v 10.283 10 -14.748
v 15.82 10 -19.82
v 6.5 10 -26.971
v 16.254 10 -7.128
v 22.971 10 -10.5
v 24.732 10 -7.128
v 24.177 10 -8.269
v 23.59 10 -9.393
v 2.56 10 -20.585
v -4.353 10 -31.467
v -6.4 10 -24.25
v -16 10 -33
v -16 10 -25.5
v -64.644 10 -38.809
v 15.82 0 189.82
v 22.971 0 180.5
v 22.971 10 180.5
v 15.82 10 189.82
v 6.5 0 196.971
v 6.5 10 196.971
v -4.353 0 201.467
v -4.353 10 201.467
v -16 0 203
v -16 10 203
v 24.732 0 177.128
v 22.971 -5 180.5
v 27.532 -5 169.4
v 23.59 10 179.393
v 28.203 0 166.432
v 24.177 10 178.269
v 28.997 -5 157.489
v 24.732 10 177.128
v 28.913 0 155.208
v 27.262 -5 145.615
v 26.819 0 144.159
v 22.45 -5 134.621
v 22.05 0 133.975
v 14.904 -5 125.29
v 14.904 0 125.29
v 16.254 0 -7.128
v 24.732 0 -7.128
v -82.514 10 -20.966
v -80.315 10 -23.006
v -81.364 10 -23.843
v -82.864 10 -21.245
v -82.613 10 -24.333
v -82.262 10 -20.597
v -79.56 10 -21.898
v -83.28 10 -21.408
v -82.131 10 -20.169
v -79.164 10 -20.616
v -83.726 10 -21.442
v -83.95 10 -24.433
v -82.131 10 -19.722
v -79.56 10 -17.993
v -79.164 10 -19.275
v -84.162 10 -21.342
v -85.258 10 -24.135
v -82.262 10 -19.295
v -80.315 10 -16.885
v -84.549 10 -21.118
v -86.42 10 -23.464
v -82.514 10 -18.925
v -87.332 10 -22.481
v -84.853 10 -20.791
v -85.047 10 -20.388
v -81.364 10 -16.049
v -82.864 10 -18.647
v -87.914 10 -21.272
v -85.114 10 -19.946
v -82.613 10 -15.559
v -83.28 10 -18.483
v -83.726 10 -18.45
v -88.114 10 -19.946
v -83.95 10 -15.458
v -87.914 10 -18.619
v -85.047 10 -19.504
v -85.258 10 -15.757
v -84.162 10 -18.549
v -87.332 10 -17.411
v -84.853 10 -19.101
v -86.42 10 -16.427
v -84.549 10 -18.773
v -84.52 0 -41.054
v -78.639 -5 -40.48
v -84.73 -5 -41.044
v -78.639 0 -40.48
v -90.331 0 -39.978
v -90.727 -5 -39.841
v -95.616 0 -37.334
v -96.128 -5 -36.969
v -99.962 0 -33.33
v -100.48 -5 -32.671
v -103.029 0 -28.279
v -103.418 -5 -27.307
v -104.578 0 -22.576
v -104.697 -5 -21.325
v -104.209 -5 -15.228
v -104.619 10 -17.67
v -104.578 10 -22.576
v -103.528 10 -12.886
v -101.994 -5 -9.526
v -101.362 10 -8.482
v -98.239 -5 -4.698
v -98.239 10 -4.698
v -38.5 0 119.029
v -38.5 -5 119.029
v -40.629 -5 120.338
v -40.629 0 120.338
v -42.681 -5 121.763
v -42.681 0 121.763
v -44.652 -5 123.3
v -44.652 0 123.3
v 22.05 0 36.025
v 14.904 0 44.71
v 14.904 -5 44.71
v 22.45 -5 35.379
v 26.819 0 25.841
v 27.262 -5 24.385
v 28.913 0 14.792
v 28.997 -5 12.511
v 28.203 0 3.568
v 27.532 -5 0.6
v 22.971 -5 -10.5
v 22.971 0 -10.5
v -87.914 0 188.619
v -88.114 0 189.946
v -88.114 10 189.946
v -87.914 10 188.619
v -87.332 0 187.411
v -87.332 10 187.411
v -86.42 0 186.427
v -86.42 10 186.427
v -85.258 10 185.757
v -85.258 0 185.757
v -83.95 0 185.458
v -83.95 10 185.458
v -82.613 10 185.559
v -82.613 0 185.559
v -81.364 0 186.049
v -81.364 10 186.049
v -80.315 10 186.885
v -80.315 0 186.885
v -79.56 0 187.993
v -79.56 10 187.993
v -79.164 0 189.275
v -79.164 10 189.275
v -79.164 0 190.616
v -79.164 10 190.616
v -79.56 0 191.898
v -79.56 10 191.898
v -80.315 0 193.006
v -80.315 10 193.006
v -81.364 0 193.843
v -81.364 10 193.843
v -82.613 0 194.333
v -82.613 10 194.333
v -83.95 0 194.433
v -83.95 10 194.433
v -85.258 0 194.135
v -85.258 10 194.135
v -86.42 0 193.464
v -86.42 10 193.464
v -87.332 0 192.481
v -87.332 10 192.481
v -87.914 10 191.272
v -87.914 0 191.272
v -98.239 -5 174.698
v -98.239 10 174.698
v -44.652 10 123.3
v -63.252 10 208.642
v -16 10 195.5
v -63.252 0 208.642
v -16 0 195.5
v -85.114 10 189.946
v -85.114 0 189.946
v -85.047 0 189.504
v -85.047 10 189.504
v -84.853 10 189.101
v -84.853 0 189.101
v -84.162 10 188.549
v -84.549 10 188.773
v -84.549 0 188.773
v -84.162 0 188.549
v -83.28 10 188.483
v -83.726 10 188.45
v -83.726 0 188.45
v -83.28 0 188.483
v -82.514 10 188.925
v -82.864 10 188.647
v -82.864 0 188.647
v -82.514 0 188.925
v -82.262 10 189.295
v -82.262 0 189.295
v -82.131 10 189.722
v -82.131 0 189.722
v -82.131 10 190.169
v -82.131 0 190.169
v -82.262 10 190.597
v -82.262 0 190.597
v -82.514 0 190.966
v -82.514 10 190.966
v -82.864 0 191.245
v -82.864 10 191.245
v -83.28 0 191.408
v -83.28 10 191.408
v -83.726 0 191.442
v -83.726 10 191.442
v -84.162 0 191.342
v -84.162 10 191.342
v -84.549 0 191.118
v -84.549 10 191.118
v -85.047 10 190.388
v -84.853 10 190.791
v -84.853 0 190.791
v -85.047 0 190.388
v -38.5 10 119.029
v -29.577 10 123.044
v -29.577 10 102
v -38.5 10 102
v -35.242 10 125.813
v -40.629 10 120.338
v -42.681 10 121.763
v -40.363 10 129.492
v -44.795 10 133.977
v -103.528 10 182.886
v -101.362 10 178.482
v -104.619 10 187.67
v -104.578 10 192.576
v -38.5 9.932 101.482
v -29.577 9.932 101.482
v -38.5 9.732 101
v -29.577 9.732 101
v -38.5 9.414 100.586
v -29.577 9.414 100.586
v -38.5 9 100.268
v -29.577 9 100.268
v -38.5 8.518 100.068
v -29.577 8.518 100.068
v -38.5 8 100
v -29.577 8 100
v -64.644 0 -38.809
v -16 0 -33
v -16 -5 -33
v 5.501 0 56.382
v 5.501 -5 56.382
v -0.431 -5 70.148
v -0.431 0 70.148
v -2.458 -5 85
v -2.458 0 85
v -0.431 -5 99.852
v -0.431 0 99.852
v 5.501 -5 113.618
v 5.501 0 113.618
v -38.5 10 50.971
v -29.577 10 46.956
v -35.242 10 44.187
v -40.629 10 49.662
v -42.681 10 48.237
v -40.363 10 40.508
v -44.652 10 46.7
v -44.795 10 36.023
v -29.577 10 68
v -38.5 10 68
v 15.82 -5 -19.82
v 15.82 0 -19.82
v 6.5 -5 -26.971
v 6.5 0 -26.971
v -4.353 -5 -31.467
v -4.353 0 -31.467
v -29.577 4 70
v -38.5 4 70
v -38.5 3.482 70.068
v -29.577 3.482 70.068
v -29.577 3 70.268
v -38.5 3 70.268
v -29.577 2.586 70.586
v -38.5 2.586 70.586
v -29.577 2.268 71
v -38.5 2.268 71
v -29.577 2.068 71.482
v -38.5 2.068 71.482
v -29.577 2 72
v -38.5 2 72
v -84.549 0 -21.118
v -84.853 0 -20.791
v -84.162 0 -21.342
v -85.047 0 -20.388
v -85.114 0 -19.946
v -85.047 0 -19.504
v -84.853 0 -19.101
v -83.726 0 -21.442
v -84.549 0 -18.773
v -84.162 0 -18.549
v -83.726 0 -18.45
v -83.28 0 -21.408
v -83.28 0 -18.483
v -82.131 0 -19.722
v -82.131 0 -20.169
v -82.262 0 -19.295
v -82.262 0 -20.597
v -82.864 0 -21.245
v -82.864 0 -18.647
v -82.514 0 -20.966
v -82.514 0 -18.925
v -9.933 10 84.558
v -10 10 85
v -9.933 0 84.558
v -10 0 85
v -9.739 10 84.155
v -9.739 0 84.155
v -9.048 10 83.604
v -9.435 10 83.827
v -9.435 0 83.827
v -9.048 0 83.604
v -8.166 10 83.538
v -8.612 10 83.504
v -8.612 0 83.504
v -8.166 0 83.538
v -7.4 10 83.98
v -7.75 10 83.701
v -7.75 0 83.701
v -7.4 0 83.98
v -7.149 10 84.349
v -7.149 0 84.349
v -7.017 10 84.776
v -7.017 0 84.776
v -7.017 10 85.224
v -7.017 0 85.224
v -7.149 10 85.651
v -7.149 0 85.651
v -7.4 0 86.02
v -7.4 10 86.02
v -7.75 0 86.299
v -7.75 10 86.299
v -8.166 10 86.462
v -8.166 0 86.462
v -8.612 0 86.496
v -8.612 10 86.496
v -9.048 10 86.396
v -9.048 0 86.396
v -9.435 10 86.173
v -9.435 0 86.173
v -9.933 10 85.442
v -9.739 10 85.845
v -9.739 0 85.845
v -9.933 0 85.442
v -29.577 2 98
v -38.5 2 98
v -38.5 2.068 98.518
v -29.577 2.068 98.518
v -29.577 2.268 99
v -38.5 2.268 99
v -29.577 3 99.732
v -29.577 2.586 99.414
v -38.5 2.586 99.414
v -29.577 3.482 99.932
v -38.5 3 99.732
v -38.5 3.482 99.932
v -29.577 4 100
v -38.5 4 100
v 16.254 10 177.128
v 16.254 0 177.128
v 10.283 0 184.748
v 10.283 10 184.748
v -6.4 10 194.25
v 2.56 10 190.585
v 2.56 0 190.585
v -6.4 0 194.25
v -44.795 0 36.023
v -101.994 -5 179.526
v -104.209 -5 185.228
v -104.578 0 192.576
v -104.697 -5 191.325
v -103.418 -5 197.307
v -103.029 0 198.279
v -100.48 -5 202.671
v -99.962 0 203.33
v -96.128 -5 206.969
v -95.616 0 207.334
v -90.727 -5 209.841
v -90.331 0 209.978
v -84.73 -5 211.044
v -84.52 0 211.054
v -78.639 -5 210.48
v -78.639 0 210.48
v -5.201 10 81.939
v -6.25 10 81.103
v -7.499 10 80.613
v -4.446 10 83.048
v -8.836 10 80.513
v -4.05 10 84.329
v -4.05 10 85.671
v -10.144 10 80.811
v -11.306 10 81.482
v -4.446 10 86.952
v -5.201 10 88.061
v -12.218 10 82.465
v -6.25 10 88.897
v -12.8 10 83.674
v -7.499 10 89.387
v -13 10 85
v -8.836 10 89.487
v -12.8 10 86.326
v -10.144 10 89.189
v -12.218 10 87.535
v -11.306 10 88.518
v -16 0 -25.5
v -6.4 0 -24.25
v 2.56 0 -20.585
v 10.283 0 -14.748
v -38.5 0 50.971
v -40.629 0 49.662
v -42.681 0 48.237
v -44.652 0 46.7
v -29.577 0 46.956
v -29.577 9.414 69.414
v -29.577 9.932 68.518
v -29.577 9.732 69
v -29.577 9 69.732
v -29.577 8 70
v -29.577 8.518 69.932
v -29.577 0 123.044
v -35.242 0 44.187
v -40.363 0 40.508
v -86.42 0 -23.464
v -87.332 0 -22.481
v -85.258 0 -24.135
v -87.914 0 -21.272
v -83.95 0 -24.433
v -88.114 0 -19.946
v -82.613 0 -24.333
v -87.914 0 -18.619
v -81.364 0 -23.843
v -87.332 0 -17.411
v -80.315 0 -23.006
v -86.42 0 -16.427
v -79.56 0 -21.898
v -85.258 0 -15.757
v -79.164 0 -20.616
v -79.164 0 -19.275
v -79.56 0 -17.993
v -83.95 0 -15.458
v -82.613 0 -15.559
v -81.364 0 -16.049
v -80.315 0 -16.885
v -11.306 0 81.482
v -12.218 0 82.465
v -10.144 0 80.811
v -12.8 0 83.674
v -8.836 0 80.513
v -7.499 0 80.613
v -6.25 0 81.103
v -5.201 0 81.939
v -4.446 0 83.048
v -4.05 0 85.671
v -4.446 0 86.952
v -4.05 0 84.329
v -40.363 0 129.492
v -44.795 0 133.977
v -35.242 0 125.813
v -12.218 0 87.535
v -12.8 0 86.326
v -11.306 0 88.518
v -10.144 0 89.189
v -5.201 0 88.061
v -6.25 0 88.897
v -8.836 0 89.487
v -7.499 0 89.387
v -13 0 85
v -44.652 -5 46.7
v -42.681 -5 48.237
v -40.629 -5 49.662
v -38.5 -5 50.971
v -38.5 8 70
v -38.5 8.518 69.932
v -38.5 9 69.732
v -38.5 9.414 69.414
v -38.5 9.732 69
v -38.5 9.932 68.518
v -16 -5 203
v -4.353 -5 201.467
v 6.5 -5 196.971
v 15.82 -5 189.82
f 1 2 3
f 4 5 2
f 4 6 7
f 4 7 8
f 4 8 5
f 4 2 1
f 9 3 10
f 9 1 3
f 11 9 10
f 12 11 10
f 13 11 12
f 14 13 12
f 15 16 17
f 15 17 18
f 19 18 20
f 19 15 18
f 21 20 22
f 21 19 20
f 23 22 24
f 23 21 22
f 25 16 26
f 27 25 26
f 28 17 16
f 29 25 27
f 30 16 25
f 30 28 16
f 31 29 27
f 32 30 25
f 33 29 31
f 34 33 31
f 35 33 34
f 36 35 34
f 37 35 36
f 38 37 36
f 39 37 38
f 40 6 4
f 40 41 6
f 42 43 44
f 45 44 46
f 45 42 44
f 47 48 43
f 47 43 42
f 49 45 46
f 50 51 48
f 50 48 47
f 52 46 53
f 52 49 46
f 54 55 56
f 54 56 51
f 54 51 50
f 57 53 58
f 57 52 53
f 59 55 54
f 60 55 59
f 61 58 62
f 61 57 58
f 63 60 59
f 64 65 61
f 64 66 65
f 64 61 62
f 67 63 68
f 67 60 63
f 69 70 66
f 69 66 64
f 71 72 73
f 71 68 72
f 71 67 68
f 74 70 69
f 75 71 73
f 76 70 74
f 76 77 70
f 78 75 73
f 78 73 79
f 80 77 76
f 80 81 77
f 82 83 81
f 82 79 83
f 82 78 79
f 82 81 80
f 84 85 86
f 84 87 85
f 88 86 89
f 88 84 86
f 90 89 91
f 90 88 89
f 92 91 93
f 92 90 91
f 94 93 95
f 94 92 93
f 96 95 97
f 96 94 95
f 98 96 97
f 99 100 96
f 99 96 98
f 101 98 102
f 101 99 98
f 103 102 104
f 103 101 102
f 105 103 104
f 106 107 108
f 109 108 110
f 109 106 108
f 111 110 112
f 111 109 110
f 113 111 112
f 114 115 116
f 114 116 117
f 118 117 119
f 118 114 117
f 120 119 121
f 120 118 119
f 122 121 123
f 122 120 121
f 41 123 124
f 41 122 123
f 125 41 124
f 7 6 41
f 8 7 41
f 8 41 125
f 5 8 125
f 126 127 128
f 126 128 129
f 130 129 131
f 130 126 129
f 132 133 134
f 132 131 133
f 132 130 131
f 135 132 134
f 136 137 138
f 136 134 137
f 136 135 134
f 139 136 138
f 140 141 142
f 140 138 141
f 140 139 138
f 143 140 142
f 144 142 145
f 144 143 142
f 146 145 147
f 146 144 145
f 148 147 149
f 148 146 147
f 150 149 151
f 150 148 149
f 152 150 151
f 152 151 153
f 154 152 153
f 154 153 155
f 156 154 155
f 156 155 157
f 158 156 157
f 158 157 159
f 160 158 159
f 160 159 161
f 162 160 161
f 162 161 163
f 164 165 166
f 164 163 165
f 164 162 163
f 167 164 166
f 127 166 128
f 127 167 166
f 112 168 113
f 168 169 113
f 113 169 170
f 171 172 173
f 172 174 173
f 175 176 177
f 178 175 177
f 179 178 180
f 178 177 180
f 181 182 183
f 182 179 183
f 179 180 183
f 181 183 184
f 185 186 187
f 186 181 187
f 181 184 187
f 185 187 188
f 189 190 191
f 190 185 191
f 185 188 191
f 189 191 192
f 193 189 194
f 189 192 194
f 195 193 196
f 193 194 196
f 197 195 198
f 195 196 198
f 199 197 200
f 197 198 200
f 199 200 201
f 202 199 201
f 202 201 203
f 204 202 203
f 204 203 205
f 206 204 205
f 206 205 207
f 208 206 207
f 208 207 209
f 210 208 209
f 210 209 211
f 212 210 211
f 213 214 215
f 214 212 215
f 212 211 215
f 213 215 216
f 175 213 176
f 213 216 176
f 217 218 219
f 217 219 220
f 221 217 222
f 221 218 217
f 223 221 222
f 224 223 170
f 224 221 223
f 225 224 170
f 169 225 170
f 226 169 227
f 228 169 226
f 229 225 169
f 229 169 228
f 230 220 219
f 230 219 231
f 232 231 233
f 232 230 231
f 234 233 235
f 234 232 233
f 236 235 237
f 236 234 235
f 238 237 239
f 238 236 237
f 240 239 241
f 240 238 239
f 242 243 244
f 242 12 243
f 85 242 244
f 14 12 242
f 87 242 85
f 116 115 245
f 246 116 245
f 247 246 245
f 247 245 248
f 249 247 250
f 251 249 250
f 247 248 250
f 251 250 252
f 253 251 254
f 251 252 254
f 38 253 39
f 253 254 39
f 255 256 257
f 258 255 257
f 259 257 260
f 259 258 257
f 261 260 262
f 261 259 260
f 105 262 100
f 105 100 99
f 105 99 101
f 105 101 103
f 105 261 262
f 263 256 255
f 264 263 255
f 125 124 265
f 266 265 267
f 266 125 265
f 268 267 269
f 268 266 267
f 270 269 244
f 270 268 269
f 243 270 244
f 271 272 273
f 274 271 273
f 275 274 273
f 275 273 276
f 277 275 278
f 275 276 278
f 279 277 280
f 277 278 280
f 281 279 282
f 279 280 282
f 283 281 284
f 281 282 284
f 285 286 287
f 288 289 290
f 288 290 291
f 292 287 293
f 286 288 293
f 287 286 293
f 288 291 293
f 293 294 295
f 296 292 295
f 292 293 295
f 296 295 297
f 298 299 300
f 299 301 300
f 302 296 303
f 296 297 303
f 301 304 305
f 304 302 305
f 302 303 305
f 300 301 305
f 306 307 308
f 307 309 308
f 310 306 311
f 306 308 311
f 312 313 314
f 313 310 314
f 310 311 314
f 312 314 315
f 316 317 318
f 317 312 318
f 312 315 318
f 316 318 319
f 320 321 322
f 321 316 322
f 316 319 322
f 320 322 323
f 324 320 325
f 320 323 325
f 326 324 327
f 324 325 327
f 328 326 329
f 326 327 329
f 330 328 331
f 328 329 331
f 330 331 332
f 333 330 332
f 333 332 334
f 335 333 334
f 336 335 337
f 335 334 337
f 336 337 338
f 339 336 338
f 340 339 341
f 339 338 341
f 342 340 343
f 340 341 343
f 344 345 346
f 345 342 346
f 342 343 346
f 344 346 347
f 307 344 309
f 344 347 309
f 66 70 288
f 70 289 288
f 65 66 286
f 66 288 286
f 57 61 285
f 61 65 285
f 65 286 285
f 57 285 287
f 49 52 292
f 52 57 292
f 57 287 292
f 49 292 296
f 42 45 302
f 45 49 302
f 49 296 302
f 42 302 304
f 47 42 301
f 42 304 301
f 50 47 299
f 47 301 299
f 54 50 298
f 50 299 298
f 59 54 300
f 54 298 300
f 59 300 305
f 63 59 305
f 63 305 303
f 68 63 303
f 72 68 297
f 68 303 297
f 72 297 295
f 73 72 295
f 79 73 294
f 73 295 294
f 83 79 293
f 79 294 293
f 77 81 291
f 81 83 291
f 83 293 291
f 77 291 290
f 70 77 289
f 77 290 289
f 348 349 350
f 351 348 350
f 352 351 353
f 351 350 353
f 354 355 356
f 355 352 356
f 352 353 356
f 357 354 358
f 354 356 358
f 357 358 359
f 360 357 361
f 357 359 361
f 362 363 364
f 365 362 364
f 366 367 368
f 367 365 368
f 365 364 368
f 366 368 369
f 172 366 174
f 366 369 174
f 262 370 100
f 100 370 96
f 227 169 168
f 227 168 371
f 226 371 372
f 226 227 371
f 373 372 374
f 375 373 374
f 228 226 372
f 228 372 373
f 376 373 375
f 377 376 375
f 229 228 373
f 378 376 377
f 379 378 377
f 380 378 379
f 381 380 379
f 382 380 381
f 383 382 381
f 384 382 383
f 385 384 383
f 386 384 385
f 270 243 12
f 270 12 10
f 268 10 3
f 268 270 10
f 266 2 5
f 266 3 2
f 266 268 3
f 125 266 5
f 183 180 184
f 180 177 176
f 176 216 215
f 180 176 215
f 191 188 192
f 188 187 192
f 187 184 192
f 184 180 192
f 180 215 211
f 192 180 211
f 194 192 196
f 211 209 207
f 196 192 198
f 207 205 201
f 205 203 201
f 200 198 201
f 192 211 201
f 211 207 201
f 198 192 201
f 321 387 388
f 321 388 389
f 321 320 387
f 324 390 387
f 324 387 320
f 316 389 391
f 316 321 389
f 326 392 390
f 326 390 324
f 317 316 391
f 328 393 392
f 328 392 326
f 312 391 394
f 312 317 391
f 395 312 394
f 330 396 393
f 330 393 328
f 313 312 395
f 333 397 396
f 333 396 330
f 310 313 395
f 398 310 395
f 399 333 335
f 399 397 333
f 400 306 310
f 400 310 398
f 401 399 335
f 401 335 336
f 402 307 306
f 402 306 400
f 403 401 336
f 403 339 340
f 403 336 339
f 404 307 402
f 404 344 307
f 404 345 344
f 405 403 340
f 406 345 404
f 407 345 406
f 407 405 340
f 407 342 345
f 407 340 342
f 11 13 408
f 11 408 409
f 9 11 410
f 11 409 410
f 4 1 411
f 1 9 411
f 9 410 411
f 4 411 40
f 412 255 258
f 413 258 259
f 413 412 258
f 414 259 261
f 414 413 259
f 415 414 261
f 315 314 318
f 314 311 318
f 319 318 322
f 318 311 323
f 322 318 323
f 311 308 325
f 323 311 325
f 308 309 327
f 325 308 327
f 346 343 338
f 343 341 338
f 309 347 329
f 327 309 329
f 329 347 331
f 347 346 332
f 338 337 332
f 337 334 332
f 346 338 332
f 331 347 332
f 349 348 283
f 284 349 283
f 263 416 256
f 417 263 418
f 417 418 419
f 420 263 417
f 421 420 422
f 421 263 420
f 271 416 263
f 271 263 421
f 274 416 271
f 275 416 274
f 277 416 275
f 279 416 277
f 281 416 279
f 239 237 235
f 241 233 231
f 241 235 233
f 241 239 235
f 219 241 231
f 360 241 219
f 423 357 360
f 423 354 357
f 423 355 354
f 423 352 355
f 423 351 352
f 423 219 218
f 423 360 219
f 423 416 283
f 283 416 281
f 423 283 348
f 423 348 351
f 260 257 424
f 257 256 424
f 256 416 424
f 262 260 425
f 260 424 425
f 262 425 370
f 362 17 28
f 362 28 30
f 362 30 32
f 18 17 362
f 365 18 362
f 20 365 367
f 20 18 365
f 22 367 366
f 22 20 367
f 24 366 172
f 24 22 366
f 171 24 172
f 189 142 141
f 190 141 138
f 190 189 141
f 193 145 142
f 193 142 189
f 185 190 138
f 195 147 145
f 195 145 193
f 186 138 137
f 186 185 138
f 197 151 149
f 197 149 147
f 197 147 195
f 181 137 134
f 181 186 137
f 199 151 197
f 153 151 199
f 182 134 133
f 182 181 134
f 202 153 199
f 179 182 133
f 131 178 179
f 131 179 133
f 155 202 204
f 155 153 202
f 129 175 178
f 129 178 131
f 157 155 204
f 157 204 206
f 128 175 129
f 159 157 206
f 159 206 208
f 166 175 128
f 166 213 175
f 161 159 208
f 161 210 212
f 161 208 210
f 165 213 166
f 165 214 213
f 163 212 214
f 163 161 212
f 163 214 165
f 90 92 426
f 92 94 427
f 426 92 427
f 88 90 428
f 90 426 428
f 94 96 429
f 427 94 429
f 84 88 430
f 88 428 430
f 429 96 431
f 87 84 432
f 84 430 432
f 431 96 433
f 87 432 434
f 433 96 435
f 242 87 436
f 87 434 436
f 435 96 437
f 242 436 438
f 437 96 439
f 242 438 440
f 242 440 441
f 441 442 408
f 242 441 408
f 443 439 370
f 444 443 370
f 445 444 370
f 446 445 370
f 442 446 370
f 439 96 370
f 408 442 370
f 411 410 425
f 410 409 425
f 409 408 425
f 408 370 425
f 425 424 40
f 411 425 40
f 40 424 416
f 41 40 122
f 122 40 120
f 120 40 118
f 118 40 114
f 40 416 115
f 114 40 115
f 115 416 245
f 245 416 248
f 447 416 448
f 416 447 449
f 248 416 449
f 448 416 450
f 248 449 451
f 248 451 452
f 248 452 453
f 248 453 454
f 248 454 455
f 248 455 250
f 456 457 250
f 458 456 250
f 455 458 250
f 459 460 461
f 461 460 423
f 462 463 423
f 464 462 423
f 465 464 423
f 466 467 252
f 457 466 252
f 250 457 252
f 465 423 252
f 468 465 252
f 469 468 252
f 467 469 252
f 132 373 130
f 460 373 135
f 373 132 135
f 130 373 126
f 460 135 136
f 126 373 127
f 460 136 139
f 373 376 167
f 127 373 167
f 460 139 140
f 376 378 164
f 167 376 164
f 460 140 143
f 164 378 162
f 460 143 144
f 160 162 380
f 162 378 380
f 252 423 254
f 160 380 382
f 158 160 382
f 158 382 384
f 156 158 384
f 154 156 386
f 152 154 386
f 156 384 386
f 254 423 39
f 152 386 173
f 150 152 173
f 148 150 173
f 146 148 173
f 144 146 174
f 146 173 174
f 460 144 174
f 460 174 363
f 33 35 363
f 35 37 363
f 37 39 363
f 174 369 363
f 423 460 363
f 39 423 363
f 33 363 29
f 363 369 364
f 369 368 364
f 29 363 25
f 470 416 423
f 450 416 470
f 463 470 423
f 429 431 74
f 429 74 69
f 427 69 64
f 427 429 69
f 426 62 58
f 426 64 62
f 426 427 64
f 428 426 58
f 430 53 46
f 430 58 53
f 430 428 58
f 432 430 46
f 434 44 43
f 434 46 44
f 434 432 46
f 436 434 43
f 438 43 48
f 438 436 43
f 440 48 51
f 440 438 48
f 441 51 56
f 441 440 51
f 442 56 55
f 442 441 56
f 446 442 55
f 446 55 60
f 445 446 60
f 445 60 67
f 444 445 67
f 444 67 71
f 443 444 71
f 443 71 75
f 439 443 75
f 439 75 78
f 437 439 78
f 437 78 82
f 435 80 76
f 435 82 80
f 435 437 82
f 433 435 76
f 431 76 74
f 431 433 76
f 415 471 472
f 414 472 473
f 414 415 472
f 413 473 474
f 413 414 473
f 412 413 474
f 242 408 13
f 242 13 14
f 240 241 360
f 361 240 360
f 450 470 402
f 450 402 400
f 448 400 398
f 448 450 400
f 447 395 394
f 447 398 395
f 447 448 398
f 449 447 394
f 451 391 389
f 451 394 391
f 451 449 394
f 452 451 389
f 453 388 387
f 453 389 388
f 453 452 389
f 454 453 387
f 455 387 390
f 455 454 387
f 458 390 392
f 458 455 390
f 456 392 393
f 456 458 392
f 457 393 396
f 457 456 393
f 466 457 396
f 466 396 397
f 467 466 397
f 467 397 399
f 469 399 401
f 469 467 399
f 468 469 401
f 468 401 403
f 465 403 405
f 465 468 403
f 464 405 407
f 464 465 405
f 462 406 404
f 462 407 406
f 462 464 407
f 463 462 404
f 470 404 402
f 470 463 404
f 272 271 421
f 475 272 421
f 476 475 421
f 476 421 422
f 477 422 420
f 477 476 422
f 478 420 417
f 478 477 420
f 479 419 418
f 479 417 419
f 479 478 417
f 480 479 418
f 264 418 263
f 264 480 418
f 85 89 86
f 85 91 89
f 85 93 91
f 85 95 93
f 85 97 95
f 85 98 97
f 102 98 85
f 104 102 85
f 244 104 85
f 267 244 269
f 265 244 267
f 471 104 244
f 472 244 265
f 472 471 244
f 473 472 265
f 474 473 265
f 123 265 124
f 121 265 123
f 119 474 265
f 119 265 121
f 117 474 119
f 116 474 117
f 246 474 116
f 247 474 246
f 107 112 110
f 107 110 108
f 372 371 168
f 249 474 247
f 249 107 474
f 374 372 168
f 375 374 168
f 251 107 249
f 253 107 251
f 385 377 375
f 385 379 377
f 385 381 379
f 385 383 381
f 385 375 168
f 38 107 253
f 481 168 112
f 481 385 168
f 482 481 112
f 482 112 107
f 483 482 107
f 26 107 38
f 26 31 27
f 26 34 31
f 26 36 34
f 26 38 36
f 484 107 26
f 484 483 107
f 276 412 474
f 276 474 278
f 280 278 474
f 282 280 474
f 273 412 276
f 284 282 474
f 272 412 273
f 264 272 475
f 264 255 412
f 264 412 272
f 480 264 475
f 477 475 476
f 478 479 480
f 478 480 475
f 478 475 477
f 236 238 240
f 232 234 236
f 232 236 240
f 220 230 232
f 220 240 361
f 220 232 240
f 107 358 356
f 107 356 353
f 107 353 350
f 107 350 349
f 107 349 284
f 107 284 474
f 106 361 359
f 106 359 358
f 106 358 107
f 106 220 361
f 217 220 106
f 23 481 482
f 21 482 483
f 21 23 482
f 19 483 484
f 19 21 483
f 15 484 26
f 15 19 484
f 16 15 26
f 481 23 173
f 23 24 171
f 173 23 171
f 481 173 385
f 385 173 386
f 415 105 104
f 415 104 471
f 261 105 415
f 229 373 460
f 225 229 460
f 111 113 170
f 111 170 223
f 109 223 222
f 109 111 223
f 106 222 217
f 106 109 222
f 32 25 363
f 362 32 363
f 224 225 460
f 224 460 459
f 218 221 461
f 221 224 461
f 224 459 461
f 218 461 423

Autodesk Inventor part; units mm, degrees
ref_plane "YZ Plane" through (0, 0, 0) normal (1, 0, 0) x (0, 1, 0)
ref_plane "XZ Plane" through (0, 0, 0) normal (0, 1, 0) x (-1, 0, 0)
ref_plane "XY Plane" through (0, 0, 0) normal (0, 0, 1) x (1, 0, 0)
sketch "Boceto1" plane through (0, 0, 0) normal (0, 1, 0) x (-1, 0, 0)
  line L0 (16, -33) -> (103.2837, -54.9444)
  line L1 (38.5, 50.9711) -> (38.5, 119.0289)
  line L2 (-22.9711, -10.5) -> (-52.9711, -10.5)
  arc A0 (-22.9711, -10.5) -> (16, -33) centre (16, 12) ccw
  arc A1 (-51.515, 38.5517) -> (-6.5, 85) centre (-52.9711, 85) ccw
  arc A2 (-22.9711, -10.5) -> (16, -33) centre (16, 12) ccw
  arc A3 (-51.515, 38.5517) -> (-52.9711, -10.5) centre (16, 12) ccw
  line L3 (38.5, 50.9711) -> (38.5, 85)
  arc A4 (103.2837, -54.9444) -> (115.3375, -21.0974) centre (95.2119, -33) ccw
  line L4 (115.3375, -21.0974) -> (44.6515, 46.7)
  line L5 (16, 203) -> (103.2837, 224.9444)
  arc A5 (16, 203) -> (-22.9711, 180.5) centre (16, 158) ccw
  line L6 (115.3375, 191.0974) -> (44.6515, 123.3)
  arc A6 (115.3375, 191.0974) -> (103.2837, 224.9444) centre (95.2119, 203) ccw
  arc A7 (16, 203) -> (-22.9711, 180.5) centre (16, 158) ccw
  line L7 (38.5, 119.0289) -> (38.5, 50.9711)
  line L8 (-22.9711, 180.5) -> (-52.9711, 180.5)
  line L9 (38.5, 119.0289) -> (38.5, 85)
  arc A8 (-52.9711, 180.5) -> (-51.515, 131.4483) centre (16, 158) ccw
  arc A9 (-6.5, 85) -> (-51.515, 131.4483) centre (-52.9711, 85) ccw
  arc A10 (-22.9711, -10.5) -> (16, -33) centre (16, 12) ccw
  arc A11 (49.4751, 42.0735) -> (38.5, 50.9711) centre (16, 12) ccw
  arc A12 (38.5, 119.0289) -> (49.4751, 127.9265) centre (16, 158) ccw
  arc A13 (16, 203) -> (-22.9711, 180.5) centre (16, 158) ccw
  circle A14 centre (83.6139, -19.9457) radius 1.5
  circle A15 centre (8.5, 85) radius 1.5
  circle A16 centre (83.6139, 189.9457) radius 1.5
  arc A17 (88.6874, -45.3867) -> (105.0119, -23.002) centre (95.2119, -33) ccw
  arc A18 (105.0119, 193.002) -> (91.4604, 216.488) centre (95.2119, 203) ccw
  arc A19 (-48.2434, 32.7133) -> (-48.2434, 137.2867) centre (-52.9711, 85) ccw
  arc A20 (-48.7329, 177.1284) -> (-48.2434, 137.2867) centre (16, 158) ccw
  arc A21 (-48.2434, 32.7133) -> (-48.7329, -7.1284) centre (16, 12) ccw
  line L10 (-48.7329, -7.1284) -> (-16.2545, -7.1284)
  line L11 (-48.7329, 177.1284) -> (-16.2545, 177.1284)
  line L12 (16, 195.5) -> (91.4604, 216.488)
  line L13 (16, -25.5) -> (88.6874, -45.3867)
  line L14 (39.4427, 41.2693) -> (105.0119, -23.002)
  line L15 (105.0119, 193.002) -> (44.7948, 133.9769)
  line L16 (29.5774, 46.9558) -> (29.5774, 123.0442)
  arc A22 (44.7948, 36.0231) -> (29.5774, 46.9558) centre (16, 12) ccw
  arc A23 (-16.2545, -7.1284) -> (16, -25.5) centre (16, 12) ccw
  arc A24 (29.5774, 123.0442) -> (44.7948, 133.9769) centre (16, 158) ccw
  arc A25 (16, 195.5) -> (-16.2545, 177.1284) centre (16, 158) ccw
  circle A26 centre (83.6139, -19.9457) radius 4.5
  circle A27 centre (8.5, 85) radius 4.5
  circle A28 centre (83.6139, 189.9457) radius 4.5
  point P0 (0, 0)
  dimension "d8" = 9
  dimension "d9" = 9
  dimension "d10" = 9
extrude "Extrusión1" add sketch "Boceto1" along normal blind 10 contours A0 L2 A3 A1 A9 A8 L8 A5 L5 A6 L6 A12 L1 A11 L4 A4 L0 | A26 | A27 | A28
sketch "Boceto2" plane through (0, 0, 0) normal (0, -1, 0) x (1, 0, 0)
  line L0 (-16, 203) -> (-103.2837, 224.9444)
  line L1 (22.9711, 180.5) -> (52.9711, 180.5)
  arc A0 (22.9711, 180.5) -> (-16, 203) centre (-16, 158) ccw
  arc A1 (22.9711, 180.5) -> (-16, 203) centre (-16, 158) ccw
  arc A2 (51.515, 131.4483) -> (52.9711, 180.5) centre (-16, 158) ccw
  line L2 (-38.5, 119.0289) -> (-38.5, 85)
  arc A3 (-103.2837, 224.9444) -> (-115.3375, 191.0974) centre (-95.2119, 203) ccw
  line L3 (-115.3375, 191.0974) -> (-44.6515, 123.3)
  line L4 (-16, -33) -> (-103.2837, -54.9444)
  arc A4 (-16, -33) -> (22.9711, -10.5) centre (-16, 12) ccw
  line L5 (-115.3375, -21.0974) -> (-44.6515, 46.7)
  arc A5 (-115.3375, -21.0974) -> (-103.2837, -54.9444) centre (-95.2119, -33) ccw
  arc A6 (-16, -33) -> (22.9711, -10.5) centre (-16, 12) ccw
  line L6 (22.9711, -10.5) -> (52.9711, -10.5)
  line L7 (-38.5, 50.9711) -> (-38.5, 85)
  arc A7 (52.9711, -10.5) -> (51.515, 38.5517) centre (-16, 12) ccw
  arc A8 (51.515, 131.4483) -> (52.9711, 180.5) centre (-16, 158) ccw projected
  arc A9 (-38.5, 50.9711) -> (-49.4751, 42.0735) centre (-16, 12) ccw
  arc A10 (-16, -33) -> (22.9711, -10.5) centre (-16, 12) ccw
  arc A11 (22.9711, 180.5) -> (-16, 203) centre (-16, 158) ccw
  arc A12 (-49.4751, 127.9265) -> (-38.5, 119.0289) centre (-16, 158) ccw
  arc A13 (51.515, 131.4483) -> (51.515, 38.5517) centre (52.9711, 85) ccw projected
  arc A14 (51.515, 131.4483) -> (51.515, 38.5517) centre (52.9711, 85) ccw
  point P0 (0, 170)
extrude "Extrusión2" add sketch "Boceto2" along normal blind 5 contours A0 L1 A2 A13 A7 L6 A4 L4 A5 L5 A9 L7 L2 A12 L3 A3 L0
sketch "Boceto3" plane through (-29.5774, 10, 123.0442) normal (1, 0, 0) x (0, 0, -1)
  line L0 (0, 0) -> (76.0885, 0) projected
  line L1 (38.0442, 0) -> (53.0442, 0)
  line L2 (72.0731, 0) -> (4.0154, 0) projected
  line L3 (38.0442, 0) -> (23.0442, 0)
  line L4 (23.0442, 0) -> (23.0442, -8)
  line L5 (23.0442, -8) -> (53.0442, -8)
  line L6 (53.0442, -8) -> (53.0442, 0)
  point P0 (123.0442, -10)
  point P1 (53.0442, 0)
  point P2 (23.0442, 0)
  dimension "d15" = 15
  dimension "d16" = 15
  dimension "d17" = 8
extrude "Extrusión3" cut sketch "Boceto3" against normal blind 15
fillet "Empalme1" radius 2 4 edges at (-34.0387, 2, 100) (-34.0387, 2, 70) (-34.0387, 10, 70) (-34.0387, 10, 100)
sketch "Boceto4" plane through (0, 10, 0) normal (0, 1, 0) x (1, 0, 0)
  line L0 (59.5944, 0) -> (46.2124, 0)
  line L1 (46.2124, 0) -> (46.2124, -23.3919)
  line L2 (46.2124, -23.3919) -> (63.6147, -23.3919)
  line L3 (63.6147, -23.3919) -> (63.6147, 0)
  circle A0 centre (-8.5, -85) radius 1.5 projected
  line L4 (-8.5, -85) -> (35.636, -85)
  line L5 (59.5944, -170) -> (46.2124, -170)
  line L6 (46.2124, -170) -> (46.2124, -146.6081)
  line L7 (46.2124, -146.6081) -> (63.6147, -146.6081)
  line L8 (63.6147, -146.6081) -> (63.6147, -170)
  line L9 (59.5944, -170) -> (63.6147, -170)
  line L10 (63.6147, 0) -> (58.9449, 0)
  point P0 (0, 0)
extrude "Extrusión4" cut sketch "Boceto4" against normal blind 8 contours L10 L3 L2 L1 L0 | L5 L6 L7 L8 L9
fillet "Empalme2" radius 2 8 edges at (53.0901, 2, 146.6081) (52.9869, 2, 170) (52.9869, 10, 170) (53.0901, 10, 146.6081) (53.0901, 2, 23.3919) (52.9869, 2, 0) (52.9869, 10, 0) (53.0901, 10, 23.3919)
sketch "Boceto5" plane through (0, 0, 0) normal (0, 1, 0) x (1, 0, 0)
  arc A0 (22.9711, 10.5) -> (-16, 33) centre (-16, -12) ccw
  arc A1 (14.9044, -44.7096) -> (-16, 33) centre (-16, -12) ccw
  arc A2 (6.5, -158) -> (-33.6139, -144) centre (-16, -158) ccw
  arc A3 (14.9044, -44.7096) -> (14.9044, -125.2904) centre (52.9711, -85) ccw
  arc A4 (-78.639, 40.4798) -> (-98.2389, 4.6975) centre (-83.6139, 19.9457) ccw
  arc A5 (-98.2389, -174.6975) -> (-78.639, -210.4798) centre (-83.6139, -189.9457) ccw
  arc A6 (-16, -203) -> (22.9711, -180.5) centre (-16, -158) ccw
  line L0 (-16, -203) -> (-83.6139, -211.0738)
  line L1 (-16, 33) -> (-83.6139, 41.0738)
  arc A7 (-16, -203) -> (14.9044, -125.2904) centre (-16, -158) ccw
  line L2 (-98.2389, 4.6975) -> (-38.5, -52.6001)
  line L3 (-38.5, -119.0289) -> (-38.5, -50.9711)
  line L4 (-98.2389, -174.6975) -> (-38.5, -117.3999)
  line L5 (-38.5, -117.3999) -> (-38.5, -52.6001)
  circle A8 centre (-16, -85) radius 202.8163
  point P0 (0, 0)
  point P1 (-44.6515, -46.7)
  point P2 (-44.6515, -123.3)
extrude "Extrusión5" cut sketch "Boceto5" against normal mid plane 30
properties part number "mando_inf"
